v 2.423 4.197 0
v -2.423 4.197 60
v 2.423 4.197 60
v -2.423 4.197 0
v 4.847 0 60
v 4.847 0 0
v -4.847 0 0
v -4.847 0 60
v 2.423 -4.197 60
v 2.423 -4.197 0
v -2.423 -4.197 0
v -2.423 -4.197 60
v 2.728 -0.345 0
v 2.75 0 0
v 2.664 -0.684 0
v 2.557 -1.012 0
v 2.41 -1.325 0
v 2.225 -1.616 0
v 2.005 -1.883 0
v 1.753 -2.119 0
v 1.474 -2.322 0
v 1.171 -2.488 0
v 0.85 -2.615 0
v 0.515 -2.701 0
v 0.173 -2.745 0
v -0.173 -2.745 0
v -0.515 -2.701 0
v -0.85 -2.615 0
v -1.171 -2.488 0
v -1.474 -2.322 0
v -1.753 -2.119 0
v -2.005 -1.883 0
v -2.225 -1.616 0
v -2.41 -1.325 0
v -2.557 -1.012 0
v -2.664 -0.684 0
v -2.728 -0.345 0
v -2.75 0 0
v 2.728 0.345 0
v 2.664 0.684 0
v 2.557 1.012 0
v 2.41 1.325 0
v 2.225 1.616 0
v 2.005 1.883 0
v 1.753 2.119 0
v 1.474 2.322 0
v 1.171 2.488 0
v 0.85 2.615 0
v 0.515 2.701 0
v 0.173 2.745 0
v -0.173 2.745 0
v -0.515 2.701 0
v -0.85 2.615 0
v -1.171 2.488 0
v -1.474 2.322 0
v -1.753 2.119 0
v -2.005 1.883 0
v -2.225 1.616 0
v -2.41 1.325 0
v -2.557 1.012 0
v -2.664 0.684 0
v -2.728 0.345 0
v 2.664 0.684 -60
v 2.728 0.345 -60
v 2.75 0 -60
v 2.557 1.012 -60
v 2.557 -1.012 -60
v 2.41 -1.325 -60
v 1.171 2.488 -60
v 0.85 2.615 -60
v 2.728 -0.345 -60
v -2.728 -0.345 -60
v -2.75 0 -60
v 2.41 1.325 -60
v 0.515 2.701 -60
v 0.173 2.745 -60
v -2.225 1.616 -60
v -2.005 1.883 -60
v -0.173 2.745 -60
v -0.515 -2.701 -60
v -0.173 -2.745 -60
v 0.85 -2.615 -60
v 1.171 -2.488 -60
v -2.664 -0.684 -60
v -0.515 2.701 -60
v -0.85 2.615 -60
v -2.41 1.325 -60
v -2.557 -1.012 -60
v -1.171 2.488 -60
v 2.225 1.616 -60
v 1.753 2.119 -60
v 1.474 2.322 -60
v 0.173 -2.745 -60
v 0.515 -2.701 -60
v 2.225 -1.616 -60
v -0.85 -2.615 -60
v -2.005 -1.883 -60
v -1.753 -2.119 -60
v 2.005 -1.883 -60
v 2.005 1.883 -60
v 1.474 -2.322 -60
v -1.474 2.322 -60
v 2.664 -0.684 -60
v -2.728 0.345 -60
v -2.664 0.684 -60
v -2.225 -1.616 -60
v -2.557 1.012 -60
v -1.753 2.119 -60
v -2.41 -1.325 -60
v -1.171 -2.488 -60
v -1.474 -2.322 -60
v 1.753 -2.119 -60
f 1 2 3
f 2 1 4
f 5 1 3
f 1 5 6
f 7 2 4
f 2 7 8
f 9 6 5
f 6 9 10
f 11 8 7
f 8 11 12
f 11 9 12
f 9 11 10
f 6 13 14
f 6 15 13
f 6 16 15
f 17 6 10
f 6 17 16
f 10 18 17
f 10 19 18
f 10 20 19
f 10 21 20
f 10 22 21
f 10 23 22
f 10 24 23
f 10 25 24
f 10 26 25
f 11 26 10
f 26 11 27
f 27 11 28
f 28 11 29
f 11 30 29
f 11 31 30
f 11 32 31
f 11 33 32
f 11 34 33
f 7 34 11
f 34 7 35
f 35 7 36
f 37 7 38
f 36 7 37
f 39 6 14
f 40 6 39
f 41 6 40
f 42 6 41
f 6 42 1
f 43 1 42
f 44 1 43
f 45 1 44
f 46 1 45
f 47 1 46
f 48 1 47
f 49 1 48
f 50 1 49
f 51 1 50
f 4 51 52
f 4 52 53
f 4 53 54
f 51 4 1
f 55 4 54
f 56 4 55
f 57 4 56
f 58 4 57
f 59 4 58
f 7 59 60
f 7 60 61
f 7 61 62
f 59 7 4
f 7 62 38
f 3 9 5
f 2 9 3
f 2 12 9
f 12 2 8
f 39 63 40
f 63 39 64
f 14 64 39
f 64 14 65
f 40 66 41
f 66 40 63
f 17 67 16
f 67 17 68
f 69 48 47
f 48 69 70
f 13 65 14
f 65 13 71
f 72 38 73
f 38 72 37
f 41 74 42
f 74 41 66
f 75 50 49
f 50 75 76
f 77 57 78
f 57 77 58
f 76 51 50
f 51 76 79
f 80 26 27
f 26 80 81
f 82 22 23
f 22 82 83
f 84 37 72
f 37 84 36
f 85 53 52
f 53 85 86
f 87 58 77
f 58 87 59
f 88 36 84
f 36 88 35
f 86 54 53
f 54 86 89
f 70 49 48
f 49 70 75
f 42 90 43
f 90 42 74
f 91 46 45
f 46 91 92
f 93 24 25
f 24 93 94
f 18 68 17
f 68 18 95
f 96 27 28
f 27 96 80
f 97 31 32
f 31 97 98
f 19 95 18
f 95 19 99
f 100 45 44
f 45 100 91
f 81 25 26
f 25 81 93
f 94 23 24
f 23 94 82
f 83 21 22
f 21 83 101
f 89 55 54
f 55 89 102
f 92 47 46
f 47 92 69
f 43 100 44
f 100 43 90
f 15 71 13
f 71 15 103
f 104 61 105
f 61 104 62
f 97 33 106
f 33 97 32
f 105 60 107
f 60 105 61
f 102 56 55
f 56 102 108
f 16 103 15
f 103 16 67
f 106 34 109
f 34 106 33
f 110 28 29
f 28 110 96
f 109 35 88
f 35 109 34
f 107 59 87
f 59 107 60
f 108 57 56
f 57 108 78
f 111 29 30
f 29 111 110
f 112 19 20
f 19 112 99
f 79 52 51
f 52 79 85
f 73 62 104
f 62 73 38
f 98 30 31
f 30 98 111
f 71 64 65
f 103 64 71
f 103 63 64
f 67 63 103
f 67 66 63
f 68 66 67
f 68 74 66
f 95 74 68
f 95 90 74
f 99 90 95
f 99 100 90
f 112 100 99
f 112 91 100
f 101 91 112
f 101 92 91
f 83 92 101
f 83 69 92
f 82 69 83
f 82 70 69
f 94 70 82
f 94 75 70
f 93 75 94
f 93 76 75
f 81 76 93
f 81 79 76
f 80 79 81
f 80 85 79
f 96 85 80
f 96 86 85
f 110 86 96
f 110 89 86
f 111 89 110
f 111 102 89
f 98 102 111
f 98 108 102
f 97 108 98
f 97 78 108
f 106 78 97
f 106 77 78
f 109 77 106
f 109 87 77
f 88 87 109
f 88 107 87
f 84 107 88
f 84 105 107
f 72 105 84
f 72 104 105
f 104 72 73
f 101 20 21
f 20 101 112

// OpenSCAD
$fn = 50;


difference() {
	union() {
		linear_extrude(height = 60) {
			polygon(points = [[4.8468000000, 0.0000000000], [2.4234000000, 4.1974519271], [-2.4234000000, 4.1974519271], [-4.8468000000, 0.0000000000], [-2.4234000000, -4.1974519271], [2.4234000000, -4.1974519271]]);
		}
		translate(v = [0, 0, -60]) {
			cylinder(h = 60, r = 2.7500000000);
		}
	}
	union();
}
